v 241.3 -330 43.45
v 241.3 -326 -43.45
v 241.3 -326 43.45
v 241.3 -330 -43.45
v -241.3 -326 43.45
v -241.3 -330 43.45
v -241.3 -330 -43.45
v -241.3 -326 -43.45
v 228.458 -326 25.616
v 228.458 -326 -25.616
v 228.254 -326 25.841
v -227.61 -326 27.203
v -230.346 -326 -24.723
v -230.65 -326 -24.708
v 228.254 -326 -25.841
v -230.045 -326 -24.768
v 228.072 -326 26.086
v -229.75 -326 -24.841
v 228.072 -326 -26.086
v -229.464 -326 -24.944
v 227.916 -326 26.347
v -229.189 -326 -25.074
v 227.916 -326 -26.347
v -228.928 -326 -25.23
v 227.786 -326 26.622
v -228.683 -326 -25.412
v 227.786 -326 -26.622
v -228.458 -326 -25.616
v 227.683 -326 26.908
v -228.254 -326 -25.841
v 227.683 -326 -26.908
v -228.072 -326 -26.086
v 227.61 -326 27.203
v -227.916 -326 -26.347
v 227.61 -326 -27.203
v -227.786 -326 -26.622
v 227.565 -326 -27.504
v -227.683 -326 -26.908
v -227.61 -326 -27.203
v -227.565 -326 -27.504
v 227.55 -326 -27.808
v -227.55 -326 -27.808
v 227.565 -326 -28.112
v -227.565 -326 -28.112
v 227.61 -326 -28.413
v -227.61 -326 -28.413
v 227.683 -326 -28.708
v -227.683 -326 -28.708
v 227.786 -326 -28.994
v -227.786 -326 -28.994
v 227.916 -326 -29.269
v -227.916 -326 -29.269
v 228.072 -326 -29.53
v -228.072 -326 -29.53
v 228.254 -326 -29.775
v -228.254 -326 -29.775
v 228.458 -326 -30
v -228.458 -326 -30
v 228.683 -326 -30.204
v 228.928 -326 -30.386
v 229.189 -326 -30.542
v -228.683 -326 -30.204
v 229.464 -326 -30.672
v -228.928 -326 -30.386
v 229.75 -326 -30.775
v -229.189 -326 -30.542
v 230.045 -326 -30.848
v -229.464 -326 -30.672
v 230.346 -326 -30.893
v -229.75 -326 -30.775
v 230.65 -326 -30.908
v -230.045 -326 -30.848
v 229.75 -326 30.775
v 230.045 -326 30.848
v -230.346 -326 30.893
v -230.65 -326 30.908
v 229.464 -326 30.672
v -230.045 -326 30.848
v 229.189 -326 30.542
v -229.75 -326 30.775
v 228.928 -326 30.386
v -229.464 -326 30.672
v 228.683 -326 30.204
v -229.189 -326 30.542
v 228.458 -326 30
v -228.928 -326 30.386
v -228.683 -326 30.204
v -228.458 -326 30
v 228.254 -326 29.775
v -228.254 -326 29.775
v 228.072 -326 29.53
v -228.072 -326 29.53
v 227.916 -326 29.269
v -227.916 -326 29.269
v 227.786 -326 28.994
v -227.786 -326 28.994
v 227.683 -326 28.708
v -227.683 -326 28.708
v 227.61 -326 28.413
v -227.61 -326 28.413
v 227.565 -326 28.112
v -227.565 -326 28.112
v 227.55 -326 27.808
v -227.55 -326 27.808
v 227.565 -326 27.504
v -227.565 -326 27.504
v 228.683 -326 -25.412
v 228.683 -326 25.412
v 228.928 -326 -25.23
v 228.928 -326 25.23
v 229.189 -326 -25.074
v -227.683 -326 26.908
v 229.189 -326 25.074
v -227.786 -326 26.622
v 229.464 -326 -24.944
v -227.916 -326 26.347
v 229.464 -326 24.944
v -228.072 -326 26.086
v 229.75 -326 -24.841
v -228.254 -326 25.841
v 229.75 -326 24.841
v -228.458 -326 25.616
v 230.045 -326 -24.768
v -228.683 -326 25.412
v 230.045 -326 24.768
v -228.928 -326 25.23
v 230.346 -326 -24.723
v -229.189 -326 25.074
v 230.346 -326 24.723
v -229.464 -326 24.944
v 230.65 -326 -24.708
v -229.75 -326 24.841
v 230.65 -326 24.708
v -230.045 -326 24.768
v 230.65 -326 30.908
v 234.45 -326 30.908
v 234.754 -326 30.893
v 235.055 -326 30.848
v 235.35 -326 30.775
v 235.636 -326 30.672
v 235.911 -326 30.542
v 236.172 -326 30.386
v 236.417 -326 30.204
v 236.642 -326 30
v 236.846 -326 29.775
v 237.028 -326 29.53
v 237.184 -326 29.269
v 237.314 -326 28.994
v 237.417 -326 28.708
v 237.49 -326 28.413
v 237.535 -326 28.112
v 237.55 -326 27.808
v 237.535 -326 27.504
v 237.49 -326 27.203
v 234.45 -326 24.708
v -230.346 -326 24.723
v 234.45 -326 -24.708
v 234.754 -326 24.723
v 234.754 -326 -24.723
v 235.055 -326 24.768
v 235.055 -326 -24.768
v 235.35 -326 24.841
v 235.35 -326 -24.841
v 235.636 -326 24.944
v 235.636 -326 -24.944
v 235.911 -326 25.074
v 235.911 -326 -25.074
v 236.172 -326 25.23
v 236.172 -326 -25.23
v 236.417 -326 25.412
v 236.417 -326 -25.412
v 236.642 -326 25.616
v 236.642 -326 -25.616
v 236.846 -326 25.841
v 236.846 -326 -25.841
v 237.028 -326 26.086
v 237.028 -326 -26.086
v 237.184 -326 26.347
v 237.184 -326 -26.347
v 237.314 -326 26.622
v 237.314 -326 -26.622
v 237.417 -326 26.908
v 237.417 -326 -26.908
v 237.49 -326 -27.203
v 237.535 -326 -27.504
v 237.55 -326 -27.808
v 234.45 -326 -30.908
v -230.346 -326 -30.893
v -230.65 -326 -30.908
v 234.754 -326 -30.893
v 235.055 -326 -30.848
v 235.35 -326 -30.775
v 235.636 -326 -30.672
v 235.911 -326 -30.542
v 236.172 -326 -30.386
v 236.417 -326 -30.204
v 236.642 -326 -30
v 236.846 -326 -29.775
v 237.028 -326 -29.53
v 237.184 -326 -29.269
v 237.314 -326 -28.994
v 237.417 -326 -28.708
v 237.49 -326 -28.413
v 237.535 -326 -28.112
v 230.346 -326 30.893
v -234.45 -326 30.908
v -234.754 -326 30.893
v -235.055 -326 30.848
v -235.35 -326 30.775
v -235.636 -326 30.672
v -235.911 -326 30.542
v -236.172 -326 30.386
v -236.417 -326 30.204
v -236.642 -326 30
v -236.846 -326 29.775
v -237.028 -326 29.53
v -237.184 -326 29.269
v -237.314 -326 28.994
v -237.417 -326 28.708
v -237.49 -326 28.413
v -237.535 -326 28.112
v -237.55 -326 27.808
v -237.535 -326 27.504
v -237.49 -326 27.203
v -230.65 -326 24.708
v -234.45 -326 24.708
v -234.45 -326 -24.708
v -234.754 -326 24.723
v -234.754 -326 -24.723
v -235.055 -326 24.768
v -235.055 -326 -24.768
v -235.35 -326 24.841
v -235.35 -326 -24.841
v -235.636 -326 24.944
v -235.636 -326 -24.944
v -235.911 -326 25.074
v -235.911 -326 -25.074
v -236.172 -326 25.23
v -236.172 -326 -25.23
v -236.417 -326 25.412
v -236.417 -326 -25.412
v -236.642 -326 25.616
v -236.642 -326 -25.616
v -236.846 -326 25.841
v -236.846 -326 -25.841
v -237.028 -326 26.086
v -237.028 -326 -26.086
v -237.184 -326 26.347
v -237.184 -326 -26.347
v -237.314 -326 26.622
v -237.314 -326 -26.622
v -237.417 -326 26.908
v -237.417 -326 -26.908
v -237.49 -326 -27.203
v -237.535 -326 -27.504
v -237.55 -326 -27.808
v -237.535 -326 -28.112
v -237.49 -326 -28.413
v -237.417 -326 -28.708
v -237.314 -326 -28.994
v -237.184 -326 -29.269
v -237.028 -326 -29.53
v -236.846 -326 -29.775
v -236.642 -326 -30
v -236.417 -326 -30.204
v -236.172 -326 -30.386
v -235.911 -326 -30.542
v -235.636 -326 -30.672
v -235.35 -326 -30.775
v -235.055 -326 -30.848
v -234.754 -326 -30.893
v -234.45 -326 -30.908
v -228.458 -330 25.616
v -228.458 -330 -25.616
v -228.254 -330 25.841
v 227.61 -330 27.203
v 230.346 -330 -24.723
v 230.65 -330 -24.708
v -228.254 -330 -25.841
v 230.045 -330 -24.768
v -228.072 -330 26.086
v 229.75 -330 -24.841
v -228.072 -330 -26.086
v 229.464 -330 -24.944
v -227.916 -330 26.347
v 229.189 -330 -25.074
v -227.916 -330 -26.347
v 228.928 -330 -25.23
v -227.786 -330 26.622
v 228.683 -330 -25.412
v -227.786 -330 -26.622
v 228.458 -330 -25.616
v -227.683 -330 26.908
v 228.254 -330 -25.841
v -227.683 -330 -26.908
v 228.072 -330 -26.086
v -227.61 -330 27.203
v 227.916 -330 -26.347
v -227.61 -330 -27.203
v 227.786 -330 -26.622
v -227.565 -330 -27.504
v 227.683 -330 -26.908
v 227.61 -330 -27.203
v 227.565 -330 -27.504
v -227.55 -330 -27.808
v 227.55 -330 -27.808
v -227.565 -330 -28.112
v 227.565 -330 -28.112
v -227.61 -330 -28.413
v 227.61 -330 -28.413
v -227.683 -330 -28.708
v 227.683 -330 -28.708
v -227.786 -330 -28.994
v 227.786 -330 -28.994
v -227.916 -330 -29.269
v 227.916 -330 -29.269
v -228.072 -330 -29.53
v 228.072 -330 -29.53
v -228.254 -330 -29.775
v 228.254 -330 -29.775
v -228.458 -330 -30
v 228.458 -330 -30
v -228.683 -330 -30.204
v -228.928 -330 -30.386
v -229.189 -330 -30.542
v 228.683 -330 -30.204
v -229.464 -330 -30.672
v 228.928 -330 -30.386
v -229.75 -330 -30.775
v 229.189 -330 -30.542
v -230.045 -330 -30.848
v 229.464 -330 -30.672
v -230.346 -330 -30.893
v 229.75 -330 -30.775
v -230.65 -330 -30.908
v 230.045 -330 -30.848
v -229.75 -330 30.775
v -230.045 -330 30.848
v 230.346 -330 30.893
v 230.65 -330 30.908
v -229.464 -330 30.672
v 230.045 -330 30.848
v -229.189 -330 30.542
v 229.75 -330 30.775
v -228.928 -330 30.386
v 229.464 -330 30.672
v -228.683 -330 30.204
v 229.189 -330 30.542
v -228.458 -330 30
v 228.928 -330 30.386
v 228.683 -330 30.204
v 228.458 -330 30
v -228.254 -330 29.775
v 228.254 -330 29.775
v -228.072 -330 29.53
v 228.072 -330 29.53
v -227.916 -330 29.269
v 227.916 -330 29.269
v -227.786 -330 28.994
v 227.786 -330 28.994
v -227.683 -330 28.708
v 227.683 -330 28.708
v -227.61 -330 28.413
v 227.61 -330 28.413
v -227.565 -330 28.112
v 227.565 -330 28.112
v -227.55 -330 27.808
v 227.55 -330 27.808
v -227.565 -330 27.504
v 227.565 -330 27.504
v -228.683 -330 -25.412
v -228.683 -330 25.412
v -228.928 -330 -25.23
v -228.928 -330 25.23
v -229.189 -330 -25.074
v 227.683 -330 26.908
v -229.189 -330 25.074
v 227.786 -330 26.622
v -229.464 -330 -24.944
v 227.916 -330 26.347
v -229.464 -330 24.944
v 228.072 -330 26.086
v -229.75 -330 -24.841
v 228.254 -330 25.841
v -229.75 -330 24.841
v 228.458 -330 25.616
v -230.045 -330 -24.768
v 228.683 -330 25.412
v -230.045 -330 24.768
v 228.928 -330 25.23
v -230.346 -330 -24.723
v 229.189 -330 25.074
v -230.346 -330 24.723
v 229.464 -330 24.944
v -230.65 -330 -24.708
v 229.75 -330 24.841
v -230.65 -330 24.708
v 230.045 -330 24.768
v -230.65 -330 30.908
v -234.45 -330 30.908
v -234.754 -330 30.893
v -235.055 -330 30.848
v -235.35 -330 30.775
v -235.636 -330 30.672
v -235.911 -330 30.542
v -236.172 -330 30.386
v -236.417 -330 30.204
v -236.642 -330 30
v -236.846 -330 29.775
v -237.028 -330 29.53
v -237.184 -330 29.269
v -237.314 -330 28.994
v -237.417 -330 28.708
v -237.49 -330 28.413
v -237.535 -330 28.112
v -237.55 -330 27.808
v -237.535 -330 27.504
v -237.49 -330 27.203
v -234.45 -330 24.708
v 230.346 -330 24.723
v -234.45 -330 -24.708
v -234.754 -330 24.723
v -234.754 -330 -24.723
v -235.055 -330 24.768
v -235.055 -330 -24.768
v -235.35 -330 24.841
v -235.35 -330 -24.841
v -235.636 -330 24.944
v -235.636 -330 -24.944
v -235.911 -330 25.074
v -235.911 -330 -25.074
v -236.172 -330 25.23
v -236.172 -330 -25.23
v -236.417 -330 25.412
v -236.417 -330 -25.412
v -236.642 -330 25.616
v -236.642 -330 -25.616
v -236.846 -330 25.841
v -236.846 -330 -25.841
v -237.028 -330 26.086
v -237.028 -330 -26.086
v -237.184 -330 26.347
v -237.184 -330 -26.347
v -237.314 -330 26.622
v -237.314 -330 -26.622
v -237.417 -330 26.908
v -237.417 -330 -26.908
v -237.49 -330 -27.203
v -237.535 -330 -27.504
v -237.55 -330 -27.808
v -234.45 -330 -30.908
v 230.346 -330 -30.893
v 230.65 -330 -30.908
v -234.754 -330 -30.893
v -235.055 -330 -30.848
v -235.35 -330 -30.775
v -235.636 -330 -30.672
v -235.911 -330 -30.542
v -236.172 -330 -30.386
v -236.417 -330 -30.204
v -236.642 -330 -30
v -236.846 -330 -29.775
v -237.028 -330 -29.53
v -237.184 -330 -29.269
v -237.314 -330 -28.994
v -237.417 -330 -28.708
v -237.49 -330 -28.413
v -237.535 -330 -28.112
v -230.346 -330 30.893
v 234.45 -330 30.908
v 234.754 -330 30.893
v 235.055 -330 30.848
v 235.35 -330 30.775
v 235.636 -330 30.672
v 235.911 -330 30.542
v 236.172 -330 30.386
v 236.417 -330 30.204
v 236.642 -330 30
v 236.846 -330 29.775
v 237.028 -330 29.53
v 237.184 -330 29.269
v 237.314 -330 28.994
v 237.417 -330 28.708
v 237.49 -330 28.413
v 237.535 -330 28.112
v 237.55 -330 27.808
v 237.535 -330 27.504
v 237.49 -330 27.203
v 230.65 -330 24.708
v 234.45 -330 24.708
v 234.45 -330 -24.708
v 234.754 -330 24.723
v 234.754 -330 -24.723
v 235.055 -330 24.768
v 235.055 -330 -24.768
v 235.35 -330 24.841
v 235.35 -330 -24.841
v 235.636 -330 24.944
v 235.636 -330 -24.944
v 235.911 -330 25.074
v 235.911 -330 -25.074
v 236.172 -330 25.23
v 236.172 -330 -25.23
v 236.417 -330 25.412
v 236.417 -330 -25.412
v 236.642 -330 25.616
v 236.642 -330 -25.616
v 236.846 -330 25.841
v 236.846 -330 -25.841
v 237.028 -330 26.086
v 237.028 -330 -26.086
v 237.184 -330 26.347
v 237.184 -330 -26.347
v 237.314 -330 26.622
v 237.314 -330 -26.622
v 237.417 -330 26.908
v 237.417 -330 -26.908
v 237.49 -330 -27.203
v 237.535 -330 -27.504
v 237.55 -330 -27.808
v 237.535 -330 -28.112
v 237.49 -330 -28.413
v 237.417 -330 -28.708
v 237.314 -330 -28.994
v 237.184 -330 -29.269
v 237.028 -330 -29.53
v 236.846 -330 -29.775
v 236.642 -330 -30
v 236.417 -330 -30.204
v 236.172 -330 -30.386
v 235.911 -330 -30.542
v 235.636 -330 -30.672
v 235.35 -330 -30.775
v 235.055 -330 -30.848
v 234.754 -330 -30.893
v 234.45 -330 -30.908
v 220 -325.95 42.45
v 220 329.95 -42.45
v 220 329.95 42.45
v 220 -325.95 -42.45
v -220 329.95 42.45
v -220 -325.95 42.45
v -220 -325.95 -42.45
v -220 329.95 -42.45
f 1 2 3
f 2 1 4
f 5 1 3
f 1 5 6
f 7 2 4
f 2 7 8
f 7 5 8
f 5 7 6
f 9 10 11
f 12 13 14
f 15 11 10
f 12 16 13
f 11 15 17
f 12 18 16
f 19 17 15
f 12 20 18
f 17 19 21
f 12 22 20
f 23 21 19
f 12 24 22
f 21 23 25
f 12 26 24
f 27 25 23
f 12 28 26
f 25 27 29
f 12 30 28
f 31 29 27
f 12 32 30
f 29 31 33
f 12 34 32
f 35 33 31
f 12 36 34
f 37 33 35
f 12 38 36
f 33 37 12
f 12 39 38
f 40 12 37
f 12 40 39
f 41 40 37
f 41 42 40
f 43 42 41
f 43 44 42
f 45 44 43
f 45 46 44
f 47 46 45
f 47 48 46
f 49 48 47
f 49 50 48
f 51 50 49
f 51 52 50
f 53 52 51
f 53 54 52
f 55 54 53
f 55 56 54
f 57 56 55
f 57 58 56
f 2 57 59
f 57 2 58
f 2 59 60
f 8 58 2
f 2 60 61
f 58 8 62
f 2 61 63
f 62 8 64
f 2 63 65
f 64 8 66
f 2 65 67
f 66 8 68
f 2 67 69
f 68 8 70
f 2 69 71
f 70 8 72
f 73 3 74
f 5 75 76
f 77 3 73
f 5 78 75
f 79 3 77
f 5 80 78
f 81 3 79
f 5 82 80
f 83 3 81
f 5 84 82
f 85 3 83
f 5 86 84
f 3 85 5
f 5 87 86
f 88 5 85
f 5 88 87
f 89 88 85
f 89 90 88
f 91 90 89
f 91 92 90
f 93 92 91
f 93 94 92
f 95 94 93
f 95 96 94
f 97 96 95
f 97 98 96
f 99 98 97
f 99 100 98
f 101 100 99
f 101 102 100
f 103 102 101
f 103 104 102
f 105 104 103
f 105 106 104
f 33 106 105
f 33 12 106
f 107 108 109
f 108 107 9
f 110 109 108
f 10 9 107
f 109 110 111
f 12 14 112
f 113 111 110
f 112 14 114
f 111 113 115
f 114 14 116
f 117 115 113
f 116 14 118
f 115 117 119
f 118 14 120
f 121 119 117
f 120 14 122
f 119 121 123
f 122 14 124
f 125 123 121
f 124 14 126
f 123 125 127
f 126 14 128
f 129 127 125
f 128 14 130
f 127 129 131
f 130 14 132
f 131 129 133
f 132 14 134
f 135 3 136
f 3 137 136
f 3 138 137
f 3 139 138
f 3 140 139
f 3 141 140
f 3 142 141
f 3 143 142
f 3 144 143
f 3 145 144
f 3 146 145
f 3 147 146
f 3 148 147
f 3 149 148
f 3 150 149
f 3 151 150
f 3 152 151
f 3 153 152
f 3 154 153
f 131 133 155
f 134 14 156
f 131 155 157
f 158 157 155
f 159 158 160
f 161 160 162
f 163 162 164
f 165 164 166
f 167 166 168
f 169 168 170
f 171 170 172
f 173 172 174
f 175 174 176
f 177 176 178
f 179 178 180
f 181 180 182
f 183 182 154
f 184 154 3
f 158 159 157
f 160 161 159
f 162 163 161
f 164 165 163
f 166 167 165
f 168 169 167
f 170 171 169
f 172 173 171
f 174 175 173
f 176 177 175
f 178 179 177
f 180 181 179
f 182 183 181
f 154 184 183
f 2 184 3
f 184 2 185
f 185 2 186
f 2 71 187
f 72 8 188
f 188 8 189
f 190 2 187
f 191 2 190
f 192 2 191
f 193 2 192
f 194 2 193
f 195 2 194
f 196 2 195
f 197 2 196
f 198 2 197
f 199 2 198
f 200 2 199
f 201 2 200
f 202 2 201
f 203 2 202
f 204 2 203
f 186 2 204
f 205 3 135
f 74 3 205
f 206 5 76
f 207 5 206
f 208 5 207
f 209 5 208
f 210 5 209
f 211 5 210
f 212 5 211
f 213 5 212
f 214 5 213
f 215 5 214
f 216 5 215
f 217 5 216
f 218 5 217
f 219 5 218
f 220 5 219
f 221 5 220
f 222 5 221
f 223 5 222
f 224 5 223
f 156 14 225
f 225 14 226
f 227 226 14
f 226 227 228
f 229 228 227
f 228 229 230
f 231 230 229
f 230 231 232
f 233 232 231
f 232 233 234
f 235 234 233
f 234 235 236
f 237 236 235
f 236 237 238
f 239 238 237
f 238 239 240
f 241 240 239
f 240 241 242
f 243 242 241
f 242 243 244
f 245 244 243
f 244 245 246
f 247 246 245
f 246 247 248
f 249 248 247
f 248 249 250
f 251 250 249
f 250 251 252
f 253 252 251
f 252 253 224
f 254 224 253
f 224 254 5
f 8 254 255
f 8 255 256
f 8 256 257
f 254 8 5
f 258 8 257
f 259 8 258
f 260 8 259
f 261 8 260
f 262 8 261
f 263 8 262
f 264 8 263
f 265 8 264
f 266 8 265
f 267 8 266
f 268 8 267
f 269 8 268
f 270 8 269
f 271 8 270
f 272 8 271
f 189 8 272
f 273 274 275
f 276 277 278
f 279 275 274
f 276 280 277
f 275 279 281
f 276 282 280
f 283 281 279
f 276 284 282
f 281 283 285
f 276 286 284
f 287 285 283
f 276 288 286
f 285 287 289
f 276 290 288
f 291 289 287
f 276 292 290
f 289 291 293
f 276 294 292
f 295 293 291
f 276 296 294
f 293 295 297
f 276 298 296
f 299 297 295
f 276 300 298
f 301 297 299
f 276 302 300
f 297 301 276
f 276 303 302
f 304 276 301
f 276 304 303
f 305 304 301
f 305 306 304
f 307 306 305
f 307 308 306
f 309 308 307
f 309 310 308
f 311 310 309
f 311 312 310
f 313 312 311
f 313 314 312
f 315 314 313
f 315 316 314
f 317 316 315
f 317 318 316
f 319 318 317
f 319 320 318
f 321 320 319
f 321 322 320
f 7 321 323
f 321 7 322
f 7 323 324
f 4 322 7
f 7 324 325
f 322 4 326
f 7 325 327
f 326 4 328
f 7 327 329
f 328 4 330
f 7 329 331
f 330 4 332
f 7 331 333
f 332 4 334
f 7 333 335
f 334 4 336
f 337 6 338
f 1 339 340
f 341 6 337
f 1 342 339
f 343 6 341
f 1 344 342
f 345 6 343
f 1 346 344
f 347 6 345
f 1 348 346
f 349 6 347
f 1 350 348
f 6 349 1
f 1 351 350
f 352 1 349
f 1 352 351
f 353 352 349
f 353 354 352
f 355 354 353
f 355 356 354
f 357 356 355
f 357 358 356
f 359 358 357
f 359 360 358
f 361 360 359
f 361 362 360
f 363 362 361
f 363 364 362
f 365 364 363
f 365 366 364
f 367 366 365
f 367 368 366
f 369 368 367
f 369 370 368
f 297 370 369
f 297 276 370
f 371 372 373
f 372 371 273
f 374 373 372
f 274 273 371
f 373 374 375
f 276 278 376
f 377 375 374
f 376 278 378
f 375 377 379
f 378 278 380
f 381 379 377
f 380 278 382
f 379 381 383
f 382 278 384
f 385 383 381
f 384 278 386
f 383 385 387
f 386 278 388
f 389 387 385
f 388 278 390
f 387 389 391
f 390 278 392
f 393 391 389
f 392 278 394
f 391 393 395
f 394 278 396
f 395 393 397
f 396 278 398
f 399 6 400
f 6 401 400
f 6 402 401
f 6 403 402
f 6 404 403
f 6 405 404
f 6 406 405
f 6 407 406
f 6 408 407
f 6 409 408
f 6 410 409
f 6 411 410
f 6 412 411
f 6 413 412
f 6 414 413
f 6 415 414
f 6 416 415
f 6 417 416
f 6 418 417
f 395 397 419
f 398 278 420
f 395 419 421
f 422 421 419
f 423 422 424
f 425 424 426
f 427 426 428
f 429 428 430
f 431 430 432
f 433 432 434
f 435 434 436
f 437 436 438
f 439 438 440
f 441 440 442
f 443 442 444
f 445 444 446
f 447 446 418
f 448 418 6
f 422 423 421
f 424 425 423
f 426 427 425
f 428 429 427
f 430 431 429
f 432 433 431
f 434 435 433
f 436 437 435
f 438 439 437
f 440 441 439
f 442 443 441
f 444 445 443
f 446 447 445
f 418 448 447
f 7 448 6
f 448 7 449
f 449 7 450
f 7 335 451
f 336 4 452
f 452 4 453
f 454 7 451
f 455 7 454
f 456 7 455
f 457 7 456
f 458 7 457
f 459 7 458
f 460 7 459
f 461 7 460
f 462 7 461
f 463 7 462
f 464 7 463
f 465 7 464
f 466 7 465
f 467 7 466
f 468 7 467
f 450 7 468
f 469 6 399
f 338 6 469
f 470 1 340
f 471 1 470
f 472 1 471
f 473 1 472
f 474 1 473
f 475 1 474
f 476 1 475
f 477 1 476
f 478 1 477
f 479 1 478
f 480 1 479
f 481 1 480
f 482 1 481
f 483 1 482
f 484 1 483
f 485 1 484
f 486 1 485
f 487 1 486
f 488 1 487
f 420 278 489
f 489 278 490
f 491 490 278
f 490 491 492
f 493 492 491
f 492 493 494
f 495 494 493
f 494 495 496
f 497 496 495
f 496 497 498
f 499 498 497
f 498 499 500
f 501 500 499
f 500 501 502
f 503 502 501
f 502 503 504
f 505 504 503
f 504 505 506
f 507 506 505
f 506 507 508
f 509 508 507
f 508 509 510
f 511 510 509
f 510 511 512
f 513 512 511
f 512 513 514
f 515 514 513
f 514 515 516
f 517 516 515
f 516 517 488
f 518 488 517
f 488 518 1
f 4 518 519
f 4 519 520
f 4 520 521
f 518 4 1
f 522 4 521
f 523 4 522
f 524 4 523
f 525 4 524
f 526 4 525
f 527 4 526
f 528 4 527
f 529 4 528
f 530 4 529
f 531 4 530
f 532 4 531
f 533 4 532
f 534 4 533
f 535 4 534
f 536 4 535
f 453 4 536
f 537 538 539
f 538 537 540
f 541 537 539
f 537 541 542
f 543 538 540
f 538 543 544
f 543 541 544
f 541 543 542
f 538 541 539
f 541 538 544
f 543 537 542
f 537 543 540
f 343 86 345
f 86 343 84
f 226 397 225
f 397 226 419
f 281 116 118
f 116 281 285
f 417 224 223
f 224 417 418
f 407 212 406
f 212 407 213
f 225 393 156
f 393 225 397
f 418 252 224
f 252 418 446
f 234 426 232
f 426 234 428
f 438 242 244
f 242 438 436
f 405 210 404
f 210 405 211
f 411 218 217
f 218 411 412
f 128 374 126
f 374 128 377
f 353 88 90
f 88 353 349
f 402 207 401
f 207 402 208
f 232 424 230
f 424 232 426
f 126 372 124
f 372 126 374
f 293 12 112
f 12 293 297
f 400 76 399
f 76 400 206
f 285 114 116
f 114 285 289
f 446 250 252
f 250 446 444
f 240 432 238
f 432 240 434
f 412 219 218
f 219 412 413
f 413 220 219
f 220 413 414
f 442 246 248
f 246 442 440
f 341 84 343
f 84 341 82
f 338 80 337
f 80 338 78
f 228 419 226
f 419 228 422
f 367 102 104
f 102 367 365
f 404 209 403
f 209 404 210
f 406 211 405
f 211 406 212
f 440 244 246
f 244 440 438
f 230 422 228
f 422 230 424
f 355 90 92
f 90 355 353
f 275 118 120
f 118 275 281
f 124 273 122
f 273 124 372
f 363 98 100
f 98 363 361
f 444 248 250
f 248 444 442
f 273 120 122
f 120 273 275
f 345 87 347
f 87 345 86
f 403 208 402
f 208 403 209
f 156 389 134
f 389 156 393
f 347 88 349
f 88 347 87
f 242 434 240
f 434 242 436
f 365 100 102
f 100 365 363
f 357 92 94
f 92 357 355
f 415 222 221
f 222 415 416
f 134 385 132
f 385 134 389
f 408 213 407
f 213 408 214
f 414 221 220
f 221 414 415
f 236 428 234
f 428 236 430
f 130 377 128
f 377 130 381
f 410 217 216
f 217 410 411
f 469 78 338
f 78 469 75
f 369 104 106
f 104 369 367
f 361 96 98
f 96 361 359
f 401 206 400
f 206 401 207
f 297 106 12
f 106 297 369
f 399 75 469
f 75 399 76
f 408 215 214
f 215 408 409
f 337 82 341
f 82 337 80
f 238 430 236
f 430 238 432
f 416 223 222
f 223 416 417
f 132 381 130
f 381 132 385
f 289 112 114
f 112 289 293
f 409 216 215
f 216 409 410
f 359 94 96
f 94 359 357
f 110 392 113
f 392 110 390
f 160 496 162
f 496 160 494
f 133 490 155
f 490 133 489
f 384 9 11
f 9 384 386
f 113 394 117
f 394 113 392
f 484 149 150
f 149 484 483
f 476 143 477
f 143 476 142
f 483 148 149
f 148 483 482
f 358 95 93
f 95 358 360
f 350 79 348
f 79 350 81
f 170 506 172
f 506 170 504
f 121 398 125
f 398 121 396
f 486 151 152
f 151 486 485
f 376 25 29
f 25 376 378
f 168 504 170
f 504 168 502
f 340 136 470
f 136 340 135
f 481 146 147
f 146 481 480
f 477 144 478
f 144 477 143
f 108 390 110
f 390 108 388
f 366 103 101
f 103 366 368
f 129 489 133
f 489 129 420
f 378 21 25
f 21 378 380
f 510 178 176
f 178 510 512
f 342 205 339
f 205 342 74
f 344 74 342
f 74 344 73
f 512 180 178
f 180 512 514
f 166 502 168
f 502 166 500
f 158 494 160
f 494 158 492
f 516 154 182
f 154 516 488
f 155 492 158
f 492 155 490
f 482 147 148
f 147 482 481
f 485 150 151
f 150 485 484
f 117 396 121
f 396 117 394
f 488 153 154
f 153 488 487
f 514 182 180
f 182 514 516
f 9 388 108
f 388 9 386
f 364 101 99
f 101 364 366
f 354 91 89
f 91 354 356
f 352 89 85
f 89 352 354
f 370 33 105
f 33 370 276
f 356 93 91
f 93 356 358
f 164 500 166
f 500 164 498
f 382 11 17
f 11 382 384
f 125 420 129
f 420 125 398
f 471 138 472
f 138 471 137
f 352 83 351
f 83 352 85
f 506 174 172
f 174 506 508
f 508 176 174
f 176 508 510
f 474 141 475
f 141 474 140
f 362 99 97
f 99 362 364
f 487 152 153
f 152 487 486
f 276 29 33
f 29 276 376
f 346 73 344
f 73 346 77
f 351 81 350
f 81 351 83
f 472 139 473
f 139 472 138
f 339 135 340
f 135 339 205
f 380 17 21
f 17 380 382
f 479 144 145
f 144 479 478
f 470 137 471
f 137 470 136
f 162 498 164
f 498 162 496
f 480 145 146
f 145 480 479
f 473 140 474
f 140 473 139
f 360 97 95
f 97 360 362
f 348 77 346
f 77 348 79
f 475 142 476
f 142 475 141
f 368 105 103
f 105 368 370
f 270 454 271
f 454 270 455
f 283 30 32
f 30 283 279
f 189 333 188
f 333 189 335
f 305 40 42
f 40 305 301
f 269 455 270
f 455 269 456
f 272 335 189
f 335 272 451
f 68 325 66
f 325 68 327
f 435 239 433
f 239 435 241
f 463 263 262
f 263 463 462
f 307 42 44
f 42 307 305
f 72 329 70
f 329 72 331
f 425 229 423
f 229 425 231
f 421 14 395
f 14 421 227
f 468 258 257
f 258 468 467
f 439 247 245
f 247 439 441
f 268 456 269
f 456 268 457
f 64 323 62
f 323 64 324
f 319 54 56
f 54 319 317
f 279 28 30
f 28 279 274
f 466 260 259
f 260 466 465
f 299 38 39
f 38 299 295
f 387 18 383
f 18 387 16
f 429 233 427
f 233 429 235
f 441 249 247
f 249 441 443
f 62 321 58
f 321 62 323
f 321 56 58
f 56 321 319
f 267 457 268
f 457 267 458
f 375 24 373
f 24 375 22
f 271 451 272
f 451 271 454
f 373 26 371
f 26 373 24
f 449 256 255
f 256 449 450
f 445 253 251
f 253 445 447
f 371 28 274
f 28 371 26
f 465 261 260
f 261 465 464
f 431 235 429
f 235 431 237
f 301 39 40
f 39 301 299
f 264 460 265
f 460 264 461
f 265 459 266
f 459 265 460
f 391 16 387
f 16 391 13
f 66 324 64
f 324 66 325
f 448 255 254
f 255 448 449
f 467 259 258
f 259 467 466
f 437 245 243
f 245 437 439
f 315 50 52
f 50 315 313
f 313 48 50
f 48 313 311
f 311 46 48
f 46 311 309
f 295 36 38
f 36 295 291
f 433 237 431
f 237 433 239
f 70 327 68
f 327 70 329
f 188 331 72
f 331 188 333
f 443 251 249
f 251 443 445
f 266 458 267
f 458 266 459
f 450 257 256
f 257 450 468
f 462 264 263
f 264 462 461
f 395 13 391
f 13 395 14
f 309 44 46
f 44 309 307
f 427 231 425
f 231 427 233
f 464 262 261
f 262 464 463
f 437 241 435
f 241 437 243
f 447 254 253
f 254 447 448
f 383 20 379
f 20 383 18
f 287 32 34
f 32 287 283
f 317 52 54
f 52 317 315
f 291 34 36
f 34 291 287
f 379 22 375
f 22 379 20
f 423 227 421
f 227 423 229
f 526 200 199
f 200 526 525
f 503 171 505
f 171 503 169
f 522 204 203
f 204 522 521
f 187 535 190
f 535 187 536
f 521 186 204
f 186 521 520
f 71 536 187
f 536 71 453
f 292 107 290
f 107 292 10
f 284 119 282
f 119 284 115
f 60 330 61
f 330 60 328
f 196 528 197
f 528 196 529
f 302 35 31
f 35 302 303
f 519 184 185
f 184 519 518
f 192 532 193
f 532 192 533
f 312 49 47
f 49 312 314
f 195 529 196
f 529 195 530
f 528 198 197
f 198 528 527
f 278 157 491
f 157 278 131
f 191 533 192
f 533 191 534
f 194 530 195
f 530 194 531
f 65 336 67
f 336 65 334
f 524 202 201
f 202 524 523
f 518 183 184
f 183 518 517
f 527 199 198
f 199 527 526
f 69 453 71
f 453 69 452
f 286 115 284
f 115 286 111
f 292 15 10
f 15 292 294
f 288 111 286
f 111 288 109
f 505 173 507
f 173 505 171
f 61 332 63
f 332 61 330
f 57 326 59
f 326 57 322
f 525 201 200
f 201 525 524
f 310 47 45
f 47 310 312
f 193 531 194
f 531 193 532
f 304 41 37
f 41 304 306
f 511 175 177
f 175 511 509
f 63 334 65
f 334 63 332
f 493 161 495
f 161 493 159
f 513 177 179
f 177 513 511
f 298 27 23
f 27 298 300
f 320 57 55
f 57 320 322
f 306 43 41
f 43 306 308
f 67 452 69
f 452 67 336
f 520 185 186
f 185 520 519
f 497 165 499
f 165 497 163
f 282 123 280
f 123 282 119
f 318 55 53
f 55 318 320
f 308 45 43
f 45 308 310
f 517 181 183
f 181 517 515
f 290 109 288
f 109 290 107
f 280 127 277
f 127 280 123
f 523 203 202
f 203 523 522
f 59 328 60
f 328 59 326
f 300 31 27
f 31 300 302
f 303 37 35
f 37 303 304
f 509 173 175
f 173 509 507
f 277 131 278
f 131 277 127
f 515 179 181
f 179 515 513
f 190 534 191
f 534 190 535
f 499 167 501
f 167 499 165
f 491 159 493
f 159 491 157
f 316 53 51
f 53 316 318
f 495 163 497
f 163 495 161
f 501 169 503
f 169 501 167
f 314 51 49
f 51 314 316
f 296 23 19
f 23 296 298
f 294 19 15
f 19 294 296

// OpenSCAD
// ============================================================================
// Atom Lithography Machine — Parametric OpenSCAD Module (S7.1-02)
// ============================================================================
// part_id           : S7.1-02
// parent_bom_id     : S7.1
// subsystem         : S7
// part_name         : Yuksek hizli NVMe RAID sertifika ve spektroskopi veri sunucusu
// material          : Steel
// temp_stage        : 300 K (kabin)
// vacuum_grade      : Atmosfer
// tolerance         : 99.99% yedekli
// computed_mass_kg  : 21.00000
// envelope_mm       : 482.600 x 698.400 x 86.900
// design_maturity   : M0_M1_DETAILED_CAD_DESIGN_ONLY
// no_lab_measurement: true
// iec61508_certified: false
// semi_s2_certified : false
// Units: millimeters (mm)
// ============================================================================

$fn = 64;

// Nominal bounding envelope parameters (mm)
bbox_x = 482.6000;
bbox_y = 698.4000;
bbox_z = 86.9000;

// Part-specific parametric dimensions
u_start = 8;
u_count = 2;
nvme_bays = 12;
depth_mm = 660.0;

// Interface / port parameters (mm)

module part_S7_1_02() {
  difference() {
    union() {
      // 19-inch EIA-310 front faceplate
      translate([0.000, -328.000, 0.000]) cube([482.600, 4.000, 86.900], center=true);
      // Main rack chassis enclosure
      translate([0.000, 2.000, 0.000]) cube([440.000, 655.900, 84.900], center=true);
    }
    // EIA-310 rack ear mounting slot (top-left)
    translate([-232.550, -328.000, 27.808]) rotate([90.000, 0.000, 0.000]) {
      hull() {
        translate([-1.900, 0, 0]) cylinder(d=6.200, h=8.000, center=true);
        translate([1.900, 0, 0]) cylinder(d=6.200, h=8.000, center=true);
      }
    }
    // EIA-310 rack ear mounting slot (top-right)
    translate([232.550, -328.000, 27.808]) rotate([90.000, 0.000, 0.000]) {
      hull() {
        translate([-1.900, 0, 0]) cylinder(d=6.200, h=8.000, center=true);
        translate([1.900, 0, 0]) cylinder(d=6.200, h=8.000, center=true);
      }
    }
    // EIA-310 rack ear mounting slot (bottom-left)
    translate([-232.550, -328.000, -27.808]) rotate([90.000, 0.000, 0.000]) {
      hull() {
        translate([-1.900, 0, 0]) cylinder(d=6.200, h=8.000, center=true);
        translate([1.900, 0, 0]) cylinder(d=6.200, h=8.000, center=true);
      }
    }
    // EIA-310 rack ear mounting slot (bottom-right)
    translate([232.550, -328.000, -27.808]) rotate([90.000, 0.000, 0.000]) {
      hull() {
        translate([-1.900, 0, 0]) cylinder(d=6.200, h=8.000, center=true);
        translate([1.900, 0, 0]) cylinder(d=6.200, h=8.000, center=true);
      }
    }
  }
}

// World assembly mounting transform (global machine frame, mm / deg):
// translate([1480.000, -108.000, 445.600]) rotate([0.000, 0.000, 0.000]) part_S7_1_02();

part_S7_1_02();
